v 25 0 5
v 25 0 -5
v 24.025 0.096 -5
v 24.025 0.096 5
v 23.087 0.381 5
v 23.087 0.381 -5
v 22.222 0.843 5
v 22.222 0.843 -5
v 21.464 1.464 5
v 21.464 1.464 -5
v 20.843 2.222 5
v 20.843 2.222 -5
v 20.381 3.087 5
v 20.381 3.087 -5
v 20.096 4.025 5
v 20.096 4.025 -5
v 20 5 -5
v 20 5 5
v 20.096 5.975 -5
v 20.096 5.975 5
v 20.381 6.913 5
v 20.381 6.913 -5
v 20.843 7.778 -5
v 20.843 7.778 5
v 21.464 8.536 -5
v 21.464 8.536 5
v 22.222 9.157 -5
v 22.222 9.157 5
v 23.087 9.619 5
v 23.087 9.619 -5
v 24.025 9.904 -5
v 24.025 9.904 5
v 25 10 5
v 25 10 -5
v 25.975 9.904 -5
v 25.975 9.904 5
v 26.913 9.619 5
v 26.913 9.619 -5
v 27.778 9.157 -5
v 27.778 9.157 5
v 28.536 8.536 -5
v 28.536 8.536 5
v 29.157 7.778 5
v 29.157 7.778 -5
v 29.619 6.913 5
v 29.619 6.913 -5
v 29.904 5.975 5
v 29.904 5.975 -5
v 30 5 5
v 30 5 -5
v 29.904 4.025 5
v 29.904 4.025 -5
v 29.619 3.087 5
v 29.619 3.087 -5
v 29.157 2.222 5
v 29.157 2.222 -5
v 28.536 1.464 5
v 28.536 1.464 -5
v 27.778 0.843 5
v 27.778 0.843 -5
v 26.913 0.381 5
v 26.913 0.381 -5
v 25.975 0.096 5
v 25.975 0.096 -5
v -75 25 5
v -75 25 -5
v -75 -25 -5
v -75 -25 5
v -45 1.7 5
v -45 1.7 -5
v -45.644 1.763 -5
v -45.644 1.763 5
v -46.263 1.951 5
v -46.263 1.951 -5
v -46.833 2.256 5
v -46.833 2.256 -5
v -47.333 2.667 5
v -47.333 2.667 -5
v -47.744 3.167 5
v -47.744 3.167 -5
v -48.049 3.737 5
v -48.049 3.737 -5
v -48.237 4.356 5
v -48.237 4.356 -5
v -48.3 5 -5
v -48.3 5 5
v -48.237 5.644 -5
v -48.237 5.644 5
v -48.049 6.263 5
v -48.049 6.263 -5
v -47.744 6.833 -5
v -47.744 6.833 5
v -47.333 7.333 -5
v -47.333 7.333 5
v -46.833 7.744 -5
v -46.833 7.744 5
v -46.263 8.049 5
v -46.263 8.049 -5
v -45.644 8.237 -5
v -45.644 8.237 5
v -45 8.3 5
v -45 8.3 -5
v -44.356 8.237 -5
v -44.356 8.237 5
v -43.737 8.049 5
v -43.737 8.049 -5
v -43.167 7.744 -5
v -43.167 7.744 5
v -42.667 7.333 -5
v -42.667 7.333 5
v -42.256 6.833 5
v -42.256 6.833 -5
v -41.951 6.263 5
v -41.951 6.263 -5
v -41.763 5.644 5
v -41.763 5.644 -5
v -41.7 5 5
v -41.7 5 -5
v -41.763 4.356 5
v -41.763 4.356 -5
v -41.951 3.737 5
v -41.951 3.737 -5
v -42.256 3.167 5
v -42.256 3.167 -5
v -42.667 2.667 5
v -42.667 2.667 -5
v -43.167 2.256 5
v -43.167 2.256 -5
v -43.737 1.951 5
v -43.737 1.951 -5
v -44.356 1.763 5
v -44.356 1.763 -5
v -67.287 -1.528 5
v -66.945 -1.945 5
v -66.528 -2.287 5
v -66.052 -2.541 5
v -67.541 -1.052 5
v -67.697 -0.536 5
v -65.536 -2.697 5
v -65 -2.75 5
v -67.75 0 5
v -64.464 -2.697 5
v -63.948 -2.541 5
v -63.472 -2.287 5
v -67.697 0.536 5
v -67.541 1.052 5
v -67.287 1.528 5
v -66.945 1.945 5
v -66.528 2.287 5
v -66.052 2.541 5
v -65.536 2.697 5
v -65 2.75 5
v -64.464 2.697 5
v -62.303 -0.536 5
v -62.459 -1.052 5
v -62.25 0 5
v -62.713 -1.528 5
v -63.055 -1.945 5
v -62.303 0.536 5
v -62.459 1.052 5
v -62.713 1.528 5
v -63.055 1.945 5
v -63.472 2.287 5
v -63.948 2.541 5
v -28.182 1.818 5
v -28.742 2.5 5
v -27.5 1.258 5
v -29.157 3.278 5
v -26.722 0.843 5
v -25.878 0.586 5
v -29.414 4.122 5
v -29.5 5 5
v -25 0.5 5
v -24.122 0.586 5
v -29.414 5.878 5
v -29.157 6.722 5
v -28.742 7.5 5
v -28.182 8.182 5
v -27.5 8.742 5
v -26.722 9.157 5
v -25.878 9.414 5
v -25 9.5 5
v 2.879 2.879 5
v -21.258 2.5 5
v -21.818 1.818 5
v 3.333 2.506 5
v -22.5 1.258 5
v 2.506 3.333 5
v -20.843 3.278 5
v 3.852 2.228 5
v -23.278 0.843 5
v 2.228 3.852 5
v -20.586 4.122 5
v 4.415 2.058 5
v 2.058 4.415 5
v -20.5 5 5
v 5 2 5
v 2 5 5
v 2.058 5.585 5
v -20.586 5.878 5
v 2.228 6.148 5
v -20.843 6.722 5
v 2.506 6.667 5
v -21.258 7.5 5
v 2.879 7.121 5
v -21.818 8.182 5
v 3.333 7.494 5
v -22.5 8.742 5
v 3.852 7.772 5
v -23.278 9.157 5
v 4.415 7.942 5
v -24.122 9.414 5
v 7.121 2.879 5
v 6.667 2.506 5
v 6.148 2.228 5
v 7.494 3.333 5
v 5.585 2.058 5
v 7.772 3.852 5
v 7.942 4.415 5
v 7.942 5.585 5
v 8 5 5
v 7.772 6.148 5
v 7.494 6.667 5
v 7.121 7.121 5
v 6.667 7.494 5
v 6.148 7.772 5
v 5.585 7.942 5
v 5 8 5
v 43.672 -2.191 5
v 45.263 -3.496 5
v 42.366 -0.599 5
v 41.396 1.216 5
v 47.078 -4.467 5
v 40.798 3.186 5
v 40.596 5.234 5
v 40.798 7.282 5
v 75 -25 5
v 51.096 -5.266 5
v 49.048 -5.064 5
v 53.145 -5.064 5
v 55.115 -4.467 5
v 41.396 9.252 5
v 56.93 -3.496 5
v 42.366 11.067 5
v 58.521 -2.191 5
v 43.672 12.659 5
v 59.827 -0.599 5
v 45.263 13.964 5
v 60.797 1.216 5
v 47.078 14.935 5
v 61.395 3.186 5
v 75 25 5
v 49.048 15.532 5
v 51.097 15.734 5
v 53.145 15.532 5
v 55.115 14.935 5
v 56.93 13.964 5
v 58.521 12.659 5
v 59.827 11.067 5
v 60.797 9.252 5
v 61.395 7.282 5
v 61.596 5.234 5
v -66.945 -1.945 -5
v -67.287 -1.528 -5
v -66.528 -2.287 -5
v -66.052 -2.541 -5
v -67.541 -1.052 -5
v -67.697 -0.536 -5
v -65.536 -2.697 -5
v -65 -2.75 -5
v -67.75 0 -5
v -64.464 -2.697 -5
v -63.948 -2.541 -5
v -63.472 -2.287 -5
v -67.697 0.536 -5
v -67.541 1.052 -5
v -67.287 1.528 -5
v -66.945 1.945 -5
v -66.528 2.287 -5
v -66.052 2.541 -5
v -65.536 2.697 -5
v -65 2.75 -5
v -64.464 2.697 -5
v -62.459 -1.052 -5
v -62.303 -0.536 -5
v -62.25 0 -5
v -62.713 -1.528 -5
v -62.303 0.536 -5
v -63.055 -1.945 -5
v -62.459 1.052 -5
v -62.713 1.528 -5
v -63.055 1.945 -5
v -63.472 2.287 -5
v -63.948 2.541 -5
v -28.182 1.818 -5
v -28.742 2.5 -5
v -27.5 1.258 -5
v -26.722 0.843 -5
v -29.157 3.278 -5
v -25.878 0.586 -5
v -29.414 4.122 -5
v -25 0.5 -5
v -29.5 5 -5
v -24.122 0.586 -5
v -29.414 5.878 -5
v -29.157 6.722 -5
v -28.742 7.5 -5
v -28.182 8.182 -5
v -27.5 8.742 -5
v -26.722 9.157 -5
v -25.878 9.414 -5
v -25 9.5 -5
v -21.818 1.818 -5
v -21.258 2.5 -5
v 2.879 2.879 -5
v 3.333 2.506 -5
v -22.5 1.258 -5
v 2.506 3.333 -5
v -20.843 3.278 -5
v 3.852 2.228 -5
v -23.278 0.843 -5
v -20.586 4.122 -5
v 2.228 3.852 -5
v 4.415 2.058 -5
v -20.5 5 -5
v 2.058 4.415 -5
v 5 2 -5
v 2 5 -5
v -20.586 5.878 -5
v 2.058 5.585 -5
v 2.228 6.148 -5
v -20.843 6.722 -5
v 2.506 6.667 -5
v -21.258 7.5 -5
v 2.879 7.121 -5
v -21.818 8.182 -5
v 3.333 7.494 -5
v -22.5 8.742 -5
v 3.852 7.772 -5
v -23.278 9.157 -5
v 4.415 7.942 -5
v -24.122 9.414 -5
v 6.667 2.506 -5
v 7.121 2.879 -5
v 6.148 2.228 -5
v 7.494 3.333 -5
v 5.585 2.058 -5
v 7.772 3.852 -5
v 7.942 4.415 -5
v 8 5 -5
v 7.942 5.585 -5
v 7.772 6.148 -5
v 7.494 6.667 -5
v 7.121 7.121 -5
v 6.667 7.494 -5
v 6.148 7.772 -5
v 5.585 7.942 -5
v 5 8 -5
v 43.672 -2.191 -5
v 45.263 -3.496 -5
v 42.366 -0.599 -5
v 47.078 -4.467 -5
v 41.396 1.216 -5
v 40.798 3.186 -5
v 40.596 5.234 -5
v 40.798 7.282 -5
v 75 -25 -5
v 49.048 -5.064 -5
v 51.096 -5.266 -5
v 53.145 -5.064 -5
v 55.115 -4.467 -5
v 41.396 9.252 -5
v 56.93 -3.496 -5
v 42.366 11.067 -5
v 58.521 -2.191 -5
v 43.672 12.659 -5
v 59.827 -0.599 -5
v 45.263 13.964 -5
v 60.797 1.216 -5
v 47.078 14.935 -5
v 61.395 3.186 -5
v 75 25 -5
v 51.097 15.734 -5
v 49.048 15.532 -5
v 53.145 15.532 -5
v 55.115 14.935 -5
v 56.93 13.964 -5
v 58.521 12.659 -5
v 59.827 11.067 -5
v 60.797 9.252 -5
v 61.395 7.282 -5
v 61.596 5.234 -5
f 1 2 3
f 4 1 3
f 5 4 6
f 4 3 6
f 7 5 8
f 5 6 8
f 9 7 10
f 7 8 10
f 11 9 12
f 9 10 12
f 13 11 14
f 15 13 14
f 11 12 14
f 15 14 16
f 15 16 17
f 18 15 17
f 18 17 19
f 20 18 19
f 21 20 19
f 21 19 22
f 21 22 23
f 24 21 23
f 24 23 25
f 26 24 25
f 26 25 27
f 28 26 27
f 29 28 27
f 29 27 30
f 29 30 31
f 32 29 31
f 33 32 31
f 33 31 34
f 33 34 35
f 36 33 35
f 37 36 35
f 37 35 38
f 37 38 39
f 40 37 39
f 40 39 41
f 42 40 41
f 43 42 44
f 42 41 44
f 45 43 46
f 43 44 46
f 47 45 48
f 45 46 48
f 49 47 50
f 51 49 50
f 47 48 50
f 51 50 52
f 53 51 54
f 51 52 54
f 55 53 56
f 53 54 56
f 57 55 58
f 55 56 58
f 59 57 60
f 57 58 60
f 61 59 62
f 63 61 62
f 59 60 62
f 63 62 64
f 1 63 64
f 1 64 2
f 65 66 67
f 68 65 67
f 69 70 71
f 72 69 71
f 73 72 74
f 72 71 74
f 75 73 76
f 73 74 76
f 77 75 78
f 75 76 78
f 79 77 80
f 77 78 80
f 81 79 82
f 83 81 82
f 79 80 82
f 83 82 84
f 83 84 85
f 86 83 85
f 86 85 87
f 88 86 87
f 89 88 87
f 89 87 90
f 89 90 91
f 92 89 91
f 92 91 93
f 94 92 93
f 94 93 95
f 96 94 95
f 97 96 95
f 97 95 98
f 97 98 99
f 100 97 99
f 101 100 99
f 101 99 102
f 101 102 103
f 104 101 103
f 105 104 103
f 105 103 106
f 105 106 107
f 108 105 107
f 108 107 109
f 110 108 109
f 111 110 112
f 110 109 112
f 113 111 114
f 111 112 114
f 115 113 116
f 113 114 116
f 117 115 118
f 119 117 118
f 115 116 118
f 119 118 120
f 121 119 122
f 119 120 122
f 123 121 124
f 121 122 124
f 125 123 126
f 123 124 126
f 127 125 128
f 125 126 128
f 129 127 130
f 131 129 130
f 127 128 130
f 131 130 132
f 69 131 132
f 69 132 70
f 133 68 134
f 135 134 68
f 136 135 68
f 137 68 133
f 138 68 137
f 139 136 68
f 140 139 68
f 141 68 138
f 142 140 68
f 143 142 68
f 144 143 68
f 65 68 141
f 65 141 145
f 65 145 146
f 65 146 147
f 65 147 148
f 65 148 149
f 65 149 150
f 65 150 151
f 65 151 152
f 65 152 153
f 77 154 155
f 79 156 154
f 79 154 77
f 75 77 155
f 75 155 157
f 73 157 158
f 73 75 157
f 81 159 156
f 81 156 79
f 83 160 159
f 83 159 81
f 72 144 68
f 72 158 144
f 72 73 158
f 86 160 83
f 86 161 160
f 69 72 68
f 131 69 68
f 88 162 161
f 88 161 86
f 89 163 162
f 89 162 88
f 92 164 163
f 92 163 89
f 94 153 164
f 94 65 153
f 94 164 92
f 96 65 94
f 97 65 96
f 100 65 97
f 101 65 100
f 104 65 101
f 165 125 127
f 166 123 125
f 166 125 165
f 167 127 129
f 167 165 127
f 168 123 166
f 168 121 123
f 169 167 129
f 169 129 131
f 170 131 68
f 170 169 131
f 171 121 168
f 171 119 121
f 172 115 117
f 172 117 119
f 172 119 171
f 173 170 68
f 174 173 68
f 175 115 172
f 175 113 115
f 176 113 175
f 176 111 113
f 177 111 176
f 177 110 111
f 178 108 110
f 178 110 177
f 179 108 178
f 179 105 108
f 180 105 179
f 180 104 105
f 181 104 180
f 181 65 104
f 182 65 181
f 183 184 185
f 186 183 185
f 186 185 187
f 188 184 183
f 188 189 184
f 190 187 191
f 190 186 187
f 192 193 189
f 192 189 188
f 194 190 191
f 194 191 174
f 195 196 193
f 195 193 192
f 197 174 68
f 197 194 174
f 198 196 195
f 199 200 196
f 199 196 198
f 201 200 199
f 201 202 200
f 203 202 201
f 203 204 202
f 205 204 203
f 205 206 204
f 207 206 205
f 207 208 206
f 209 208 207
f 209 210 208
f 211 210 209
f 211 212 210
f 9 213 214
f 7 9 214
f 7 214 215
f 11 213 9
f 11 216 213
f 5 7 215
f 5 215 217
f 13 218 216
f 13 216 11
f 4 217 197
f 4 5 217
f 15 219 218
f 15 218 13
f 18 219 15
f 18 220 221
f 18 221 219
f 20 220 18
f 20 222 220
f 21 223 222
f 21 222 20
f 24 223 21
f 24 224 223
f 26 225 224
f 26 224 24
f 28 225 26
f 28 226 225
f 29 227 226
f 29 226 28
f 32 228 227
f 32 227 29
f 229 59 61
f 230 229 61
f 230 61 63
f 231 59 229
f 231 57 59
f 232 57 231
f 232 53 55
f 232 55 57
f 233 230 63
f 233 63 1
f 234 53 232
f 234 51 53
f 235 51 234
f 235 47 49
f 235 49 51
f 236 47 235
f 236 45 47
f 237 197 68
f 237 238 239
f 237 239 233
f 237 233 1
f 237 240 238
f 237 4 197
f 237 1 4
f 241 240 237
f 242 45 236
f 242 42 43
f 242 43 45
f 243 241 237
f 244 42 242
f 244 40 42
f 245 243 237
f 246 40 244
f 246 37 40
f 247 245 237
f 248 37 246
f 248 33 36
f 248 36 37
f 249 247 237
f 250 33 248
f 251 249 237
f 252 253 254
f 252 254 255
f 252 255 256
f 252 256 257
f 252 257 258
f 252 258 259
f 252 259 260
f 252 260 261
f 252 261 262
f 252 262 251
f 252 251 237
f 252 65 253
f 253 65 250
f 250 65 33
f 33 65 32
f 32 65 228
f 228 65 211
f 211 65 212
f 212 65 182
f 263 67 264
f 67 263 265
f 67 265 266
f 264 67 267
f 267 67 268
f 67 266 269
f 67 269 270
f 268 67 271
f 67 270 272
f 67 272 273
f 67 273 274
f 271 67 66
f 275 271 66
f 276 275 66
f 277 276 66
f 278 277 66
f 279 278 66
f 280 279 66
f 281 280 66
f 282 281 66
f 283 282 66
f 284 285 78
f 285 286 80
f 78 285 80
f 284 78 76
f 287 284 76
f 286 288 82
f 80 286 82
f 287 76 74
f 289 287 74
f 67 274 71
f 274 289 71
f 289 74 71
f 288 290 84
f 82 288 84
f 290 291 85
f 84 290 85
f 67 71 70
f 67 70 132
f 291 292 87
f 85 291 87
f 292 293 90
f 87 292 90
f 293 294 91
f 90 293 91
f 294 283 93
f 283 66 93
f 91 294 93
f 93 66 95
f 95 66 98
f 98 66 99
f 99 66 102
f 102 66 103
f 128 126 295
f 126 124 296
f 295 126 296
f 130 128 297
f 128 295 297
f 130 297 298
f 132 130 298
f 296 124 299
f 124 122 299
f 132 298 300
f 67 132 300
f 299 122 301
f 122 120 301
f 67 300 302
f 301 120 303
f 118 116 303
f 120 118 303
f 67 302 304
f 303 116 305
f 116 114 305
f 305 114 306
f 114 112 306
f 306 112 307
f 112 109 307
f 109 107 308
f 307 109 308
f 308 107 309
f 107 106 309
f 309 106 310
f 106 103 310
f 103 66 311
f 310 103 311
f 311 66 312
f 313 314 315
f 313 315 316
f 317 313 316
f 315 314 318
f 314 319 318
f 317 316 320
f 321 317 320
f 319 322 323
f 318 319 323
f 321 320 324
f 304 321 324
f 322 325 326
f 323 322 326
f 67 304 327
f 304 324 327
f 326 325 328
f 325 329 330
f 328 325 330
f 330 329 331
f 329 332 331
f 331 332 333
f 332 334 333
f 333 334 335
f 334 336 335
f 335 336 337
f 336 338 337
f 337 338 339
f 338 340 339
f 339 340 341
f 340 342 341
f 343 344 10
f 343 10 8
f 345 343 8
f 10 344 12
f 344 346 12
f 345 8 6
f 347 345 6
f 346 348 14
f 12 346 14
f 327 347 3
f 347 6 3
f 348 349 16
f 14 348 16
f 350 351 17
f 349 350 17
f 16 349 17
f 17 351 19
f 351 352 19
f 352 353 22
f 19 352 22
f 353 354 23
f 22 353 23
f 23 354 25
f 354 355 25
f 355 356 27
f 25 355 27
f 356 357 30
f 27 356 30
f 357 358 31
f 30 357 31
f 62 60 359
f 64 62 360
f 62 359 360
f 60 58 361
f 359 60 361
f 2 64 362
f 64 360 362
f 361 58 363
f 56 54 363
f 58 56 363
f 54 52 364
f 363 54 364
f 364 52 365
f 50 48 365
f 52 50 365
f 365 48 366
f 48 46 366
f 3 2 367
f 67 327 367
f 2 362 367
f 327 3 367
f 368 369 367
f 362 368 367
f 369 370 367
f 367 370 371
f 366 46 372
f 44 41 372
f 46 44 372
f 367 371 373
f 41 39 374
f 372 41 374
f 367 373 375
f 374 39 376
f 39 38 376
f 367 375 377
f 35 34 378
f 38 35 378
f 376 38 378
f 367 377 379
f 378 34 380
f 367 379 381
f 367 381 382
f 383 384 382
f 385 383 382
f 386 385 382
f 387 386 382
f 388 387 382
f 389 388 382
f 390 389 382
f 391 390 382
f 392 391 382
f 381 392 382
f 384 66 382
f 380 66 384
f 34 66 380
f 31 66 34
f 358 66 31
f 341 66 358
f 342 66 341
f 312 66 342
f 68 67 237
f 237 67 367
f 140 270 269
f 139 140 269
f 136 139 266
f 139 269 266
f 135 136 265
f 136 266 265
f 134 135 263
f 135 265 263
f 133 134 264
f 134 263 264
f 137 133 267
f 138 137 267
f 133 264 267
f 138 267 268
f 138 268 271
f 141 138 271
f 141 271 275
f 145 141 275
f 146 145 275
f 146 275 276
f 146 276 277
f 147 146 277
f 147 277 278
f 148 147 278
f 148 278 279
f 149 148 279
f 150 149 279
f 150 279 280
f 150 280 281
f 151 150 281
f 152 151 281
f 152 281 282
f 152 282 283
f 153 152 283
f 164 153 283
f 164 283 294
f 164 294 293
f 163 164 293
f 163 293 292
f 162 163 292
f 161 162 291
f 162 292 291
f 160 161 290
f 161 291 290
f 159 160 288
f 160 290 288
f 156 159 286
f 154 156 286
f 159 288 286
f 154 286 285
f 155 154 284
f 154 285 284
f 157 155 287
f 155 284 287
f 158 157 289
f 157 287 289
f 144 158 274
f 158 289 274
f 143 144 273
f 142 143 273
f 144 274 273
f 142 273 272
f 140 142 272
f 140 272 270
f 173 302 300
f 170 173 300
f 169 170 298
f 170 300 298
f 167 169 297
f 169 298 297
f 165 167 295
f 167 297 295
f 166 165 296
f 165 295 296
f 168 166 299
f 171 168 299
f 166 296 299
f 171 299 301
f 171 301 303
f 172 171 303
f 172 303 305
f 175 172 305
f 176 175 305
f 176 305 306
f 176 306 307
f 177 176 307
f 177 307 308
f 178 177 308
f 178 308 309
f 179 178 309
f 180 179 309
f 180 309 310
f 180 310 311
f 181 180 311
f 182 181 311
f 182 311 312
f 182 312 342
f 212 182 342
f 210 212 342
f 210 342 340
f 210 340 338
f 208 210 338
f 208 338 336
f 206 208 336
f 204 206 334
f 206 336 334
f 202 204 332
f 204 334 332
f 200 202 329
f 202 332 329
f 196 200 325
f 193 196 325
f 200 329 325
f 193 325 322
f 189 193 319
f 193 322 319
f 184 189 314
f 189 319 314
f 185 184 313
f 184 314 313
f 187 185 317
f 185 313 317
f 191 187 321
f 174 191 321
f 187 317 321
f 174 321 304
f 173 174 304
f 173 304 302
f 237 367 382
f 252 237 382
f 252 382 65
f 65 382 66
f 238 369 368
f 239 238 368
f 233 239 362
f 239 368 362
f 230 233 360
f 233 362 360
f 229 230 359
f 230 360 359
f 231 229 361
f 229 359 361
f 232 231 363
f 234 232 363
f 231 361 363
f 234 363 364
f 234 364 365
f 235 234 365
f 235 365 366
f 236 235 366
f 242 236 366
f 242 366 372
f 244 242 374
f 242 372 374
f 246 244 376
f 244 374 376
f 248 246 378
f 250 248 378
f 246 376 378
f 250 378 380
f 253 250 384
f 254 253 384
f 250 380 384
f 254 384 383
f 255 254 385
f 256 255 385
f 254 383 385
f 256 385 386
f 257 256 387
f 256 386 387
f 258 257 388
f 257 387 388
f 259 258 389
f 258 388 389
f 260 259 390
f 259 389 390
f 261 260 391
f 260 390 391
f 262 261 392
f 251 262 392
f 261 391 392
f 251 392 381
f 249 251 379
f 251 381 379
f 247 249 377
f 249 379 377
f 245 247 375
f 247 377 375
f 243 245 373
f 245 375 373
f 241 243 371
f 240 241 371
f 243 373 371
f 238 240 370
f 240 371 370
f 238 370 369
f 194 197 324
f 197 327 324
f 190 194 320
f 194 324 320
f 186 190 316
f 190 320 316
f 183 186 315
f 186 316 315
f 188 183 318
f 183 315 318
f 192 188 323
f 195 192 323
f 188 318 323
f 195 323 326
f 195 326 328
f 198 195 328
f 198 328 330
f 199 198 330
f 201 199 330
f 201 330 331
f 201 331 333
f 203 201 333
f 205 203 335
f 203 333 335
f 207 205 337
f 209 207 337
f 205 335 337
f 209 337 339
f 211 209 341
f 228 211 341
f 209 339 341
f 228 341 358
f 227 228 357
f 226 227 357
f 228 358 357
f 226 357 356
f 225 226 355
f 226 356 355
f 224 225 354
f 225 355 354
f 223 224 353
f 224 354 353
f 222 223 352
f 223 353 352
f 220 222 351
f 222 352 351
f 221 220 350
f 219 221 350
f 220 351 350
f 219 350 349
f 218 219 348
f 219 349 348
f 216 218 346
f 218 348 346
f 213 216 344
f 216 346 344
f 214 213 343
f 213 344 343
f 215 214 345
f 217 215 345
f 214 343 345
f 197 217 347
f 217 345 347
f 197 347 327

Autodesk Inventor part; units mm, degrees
ref_plane "YZ Plane" through (0, 0, 0) normal (1, 0, 0) x (0, 1, 0)
ref_plane "XZ Plane" through (0, 0, 0) normal (0, 1, 0) x (-1, 0, 0)
ref_plane "XY Plane" through (0, 0, 0) normal (0, 0, 1) x (1, 0, 0)
sketch "Sketch2" plane through (0, 0, 0) normal (0, 0, 1) x (1, 0, 0)
  line L0 (-75, -25) -> (75, -25)
  line L1 (75, -25) -> (75, 25)
  line L2 (75, 25) -> (-75, 25)
  line L3 (-75, 25) -> (-75, -25)
  line L4 (-75, -25) -> (75, 25) construction
  line L5 (75, -25) -> (-75, 25) construction
  point P0 (0, 0)
  dimension "d1" = 150
  dimension "d2" = 50
extrude "Extrusion1" add sketch "Sketch2" along normal mid plane 10
sketch "Sketch3" plane through (0, 0, 5) normal (0, 0, 1) x (1, 0, 0)
  line L0 (-75, 25) -> (-75, -25) projected
  line L1 (75, 25) -> (-75, 25) projected
  point P0 (0, 0)
  point P1 (-65, 0)
  dimension "d40" = 10
  dimension "d43" = 25
hole "Hole1" at (-65, 0, 5) direction (0, 0, -1) diameter 5.5 depth 14.2 tip angle 118 clearance for "Socket Head Cap Screw" size "M5" standard "TS Profile"
sketch "Sketch4" plane through (0, 0, 5) normal (0, 0, 1) x (1, 0, 0)
  line L0 (-75, 25) -> (-75, -25) projected
  line L1 (75, 25) -> (-75, 25) projected
  point P0 (0, 0)
  point P1 (-45, 5)
  dimension "d41" = 30
  dimension "d42" = 20
hole "Hole2" at (-45, 5, 5) direction (0, 0, -1) diameter 6.6 depth 14.2 tip angle 118 clearance for "Socket Head Cap Screw" size "M6" standard "TS Profile"
sketch "Sketch5" plane through (0, 0, 5) normal (0, 0, 1) x (1, 0, 0)
  line L0 (-75, 25) -> (-75, -25) projected
  line L1 (75, 25) -> (-75, 25) projected
  point P0 (0, 0)
  point P1 (-25, 5)
  dimension "d44" = 50
  dimension "d45" = 20
hole "Hole3" at (-25, 5, 5) direction (0, 0, -1) diameter 9 depth 14.2 tip angle 118 clearance for "Socket Head Cap Screw" size "M8" standard "TS Profile"
sketch "Sketch6" plane through (0, 0, 5) normal (0, 0, 1) x (1, 0, 0)
  line L0 (-75, 25) -> (-75, -25) projected
  line L1 (75, 25) -> (-75, 25) projected
  point P0 (0, 0)
  point P1 (5, 5)
  dimension "d46" = 80
  dimension "d47" = 20
hole "Hole4" at (5, 5, 5) direction (0, 0, -1) diameter 6 depth 14.2 tip angle 118
sketch "Sketch7" plane through (0, 0, 5) normal (0, 0, 1) x (1, 0, 0)
  line L0 (-75, 25) -> (-75, -25) projected
  line L1 (75, 25) -> (-75, 25) projected
  point P0 (0, 0)
  point P1 (25, 5)
  dimension "d48" = 100
  dimension "d49" = 20
hole "Hole5" at (25, 5, 5) direction (0, 0, -1) diameter 10 depth 14.2 tip angle 118
sketch "Sketch8" plane through (0, 0, 5) normal (0, 0, 1) x (1, 0, 0)
  point P0 (0, 0)
  point P1 (51.0965, 5.234)
hole "Hole6" at (51.0965, 5.234, 5) direction (0, 0, -1) diameter 21 depth 14.2 tip angle 118
properties part number "홀간 거리 확인 파트-1" material "SS400"
